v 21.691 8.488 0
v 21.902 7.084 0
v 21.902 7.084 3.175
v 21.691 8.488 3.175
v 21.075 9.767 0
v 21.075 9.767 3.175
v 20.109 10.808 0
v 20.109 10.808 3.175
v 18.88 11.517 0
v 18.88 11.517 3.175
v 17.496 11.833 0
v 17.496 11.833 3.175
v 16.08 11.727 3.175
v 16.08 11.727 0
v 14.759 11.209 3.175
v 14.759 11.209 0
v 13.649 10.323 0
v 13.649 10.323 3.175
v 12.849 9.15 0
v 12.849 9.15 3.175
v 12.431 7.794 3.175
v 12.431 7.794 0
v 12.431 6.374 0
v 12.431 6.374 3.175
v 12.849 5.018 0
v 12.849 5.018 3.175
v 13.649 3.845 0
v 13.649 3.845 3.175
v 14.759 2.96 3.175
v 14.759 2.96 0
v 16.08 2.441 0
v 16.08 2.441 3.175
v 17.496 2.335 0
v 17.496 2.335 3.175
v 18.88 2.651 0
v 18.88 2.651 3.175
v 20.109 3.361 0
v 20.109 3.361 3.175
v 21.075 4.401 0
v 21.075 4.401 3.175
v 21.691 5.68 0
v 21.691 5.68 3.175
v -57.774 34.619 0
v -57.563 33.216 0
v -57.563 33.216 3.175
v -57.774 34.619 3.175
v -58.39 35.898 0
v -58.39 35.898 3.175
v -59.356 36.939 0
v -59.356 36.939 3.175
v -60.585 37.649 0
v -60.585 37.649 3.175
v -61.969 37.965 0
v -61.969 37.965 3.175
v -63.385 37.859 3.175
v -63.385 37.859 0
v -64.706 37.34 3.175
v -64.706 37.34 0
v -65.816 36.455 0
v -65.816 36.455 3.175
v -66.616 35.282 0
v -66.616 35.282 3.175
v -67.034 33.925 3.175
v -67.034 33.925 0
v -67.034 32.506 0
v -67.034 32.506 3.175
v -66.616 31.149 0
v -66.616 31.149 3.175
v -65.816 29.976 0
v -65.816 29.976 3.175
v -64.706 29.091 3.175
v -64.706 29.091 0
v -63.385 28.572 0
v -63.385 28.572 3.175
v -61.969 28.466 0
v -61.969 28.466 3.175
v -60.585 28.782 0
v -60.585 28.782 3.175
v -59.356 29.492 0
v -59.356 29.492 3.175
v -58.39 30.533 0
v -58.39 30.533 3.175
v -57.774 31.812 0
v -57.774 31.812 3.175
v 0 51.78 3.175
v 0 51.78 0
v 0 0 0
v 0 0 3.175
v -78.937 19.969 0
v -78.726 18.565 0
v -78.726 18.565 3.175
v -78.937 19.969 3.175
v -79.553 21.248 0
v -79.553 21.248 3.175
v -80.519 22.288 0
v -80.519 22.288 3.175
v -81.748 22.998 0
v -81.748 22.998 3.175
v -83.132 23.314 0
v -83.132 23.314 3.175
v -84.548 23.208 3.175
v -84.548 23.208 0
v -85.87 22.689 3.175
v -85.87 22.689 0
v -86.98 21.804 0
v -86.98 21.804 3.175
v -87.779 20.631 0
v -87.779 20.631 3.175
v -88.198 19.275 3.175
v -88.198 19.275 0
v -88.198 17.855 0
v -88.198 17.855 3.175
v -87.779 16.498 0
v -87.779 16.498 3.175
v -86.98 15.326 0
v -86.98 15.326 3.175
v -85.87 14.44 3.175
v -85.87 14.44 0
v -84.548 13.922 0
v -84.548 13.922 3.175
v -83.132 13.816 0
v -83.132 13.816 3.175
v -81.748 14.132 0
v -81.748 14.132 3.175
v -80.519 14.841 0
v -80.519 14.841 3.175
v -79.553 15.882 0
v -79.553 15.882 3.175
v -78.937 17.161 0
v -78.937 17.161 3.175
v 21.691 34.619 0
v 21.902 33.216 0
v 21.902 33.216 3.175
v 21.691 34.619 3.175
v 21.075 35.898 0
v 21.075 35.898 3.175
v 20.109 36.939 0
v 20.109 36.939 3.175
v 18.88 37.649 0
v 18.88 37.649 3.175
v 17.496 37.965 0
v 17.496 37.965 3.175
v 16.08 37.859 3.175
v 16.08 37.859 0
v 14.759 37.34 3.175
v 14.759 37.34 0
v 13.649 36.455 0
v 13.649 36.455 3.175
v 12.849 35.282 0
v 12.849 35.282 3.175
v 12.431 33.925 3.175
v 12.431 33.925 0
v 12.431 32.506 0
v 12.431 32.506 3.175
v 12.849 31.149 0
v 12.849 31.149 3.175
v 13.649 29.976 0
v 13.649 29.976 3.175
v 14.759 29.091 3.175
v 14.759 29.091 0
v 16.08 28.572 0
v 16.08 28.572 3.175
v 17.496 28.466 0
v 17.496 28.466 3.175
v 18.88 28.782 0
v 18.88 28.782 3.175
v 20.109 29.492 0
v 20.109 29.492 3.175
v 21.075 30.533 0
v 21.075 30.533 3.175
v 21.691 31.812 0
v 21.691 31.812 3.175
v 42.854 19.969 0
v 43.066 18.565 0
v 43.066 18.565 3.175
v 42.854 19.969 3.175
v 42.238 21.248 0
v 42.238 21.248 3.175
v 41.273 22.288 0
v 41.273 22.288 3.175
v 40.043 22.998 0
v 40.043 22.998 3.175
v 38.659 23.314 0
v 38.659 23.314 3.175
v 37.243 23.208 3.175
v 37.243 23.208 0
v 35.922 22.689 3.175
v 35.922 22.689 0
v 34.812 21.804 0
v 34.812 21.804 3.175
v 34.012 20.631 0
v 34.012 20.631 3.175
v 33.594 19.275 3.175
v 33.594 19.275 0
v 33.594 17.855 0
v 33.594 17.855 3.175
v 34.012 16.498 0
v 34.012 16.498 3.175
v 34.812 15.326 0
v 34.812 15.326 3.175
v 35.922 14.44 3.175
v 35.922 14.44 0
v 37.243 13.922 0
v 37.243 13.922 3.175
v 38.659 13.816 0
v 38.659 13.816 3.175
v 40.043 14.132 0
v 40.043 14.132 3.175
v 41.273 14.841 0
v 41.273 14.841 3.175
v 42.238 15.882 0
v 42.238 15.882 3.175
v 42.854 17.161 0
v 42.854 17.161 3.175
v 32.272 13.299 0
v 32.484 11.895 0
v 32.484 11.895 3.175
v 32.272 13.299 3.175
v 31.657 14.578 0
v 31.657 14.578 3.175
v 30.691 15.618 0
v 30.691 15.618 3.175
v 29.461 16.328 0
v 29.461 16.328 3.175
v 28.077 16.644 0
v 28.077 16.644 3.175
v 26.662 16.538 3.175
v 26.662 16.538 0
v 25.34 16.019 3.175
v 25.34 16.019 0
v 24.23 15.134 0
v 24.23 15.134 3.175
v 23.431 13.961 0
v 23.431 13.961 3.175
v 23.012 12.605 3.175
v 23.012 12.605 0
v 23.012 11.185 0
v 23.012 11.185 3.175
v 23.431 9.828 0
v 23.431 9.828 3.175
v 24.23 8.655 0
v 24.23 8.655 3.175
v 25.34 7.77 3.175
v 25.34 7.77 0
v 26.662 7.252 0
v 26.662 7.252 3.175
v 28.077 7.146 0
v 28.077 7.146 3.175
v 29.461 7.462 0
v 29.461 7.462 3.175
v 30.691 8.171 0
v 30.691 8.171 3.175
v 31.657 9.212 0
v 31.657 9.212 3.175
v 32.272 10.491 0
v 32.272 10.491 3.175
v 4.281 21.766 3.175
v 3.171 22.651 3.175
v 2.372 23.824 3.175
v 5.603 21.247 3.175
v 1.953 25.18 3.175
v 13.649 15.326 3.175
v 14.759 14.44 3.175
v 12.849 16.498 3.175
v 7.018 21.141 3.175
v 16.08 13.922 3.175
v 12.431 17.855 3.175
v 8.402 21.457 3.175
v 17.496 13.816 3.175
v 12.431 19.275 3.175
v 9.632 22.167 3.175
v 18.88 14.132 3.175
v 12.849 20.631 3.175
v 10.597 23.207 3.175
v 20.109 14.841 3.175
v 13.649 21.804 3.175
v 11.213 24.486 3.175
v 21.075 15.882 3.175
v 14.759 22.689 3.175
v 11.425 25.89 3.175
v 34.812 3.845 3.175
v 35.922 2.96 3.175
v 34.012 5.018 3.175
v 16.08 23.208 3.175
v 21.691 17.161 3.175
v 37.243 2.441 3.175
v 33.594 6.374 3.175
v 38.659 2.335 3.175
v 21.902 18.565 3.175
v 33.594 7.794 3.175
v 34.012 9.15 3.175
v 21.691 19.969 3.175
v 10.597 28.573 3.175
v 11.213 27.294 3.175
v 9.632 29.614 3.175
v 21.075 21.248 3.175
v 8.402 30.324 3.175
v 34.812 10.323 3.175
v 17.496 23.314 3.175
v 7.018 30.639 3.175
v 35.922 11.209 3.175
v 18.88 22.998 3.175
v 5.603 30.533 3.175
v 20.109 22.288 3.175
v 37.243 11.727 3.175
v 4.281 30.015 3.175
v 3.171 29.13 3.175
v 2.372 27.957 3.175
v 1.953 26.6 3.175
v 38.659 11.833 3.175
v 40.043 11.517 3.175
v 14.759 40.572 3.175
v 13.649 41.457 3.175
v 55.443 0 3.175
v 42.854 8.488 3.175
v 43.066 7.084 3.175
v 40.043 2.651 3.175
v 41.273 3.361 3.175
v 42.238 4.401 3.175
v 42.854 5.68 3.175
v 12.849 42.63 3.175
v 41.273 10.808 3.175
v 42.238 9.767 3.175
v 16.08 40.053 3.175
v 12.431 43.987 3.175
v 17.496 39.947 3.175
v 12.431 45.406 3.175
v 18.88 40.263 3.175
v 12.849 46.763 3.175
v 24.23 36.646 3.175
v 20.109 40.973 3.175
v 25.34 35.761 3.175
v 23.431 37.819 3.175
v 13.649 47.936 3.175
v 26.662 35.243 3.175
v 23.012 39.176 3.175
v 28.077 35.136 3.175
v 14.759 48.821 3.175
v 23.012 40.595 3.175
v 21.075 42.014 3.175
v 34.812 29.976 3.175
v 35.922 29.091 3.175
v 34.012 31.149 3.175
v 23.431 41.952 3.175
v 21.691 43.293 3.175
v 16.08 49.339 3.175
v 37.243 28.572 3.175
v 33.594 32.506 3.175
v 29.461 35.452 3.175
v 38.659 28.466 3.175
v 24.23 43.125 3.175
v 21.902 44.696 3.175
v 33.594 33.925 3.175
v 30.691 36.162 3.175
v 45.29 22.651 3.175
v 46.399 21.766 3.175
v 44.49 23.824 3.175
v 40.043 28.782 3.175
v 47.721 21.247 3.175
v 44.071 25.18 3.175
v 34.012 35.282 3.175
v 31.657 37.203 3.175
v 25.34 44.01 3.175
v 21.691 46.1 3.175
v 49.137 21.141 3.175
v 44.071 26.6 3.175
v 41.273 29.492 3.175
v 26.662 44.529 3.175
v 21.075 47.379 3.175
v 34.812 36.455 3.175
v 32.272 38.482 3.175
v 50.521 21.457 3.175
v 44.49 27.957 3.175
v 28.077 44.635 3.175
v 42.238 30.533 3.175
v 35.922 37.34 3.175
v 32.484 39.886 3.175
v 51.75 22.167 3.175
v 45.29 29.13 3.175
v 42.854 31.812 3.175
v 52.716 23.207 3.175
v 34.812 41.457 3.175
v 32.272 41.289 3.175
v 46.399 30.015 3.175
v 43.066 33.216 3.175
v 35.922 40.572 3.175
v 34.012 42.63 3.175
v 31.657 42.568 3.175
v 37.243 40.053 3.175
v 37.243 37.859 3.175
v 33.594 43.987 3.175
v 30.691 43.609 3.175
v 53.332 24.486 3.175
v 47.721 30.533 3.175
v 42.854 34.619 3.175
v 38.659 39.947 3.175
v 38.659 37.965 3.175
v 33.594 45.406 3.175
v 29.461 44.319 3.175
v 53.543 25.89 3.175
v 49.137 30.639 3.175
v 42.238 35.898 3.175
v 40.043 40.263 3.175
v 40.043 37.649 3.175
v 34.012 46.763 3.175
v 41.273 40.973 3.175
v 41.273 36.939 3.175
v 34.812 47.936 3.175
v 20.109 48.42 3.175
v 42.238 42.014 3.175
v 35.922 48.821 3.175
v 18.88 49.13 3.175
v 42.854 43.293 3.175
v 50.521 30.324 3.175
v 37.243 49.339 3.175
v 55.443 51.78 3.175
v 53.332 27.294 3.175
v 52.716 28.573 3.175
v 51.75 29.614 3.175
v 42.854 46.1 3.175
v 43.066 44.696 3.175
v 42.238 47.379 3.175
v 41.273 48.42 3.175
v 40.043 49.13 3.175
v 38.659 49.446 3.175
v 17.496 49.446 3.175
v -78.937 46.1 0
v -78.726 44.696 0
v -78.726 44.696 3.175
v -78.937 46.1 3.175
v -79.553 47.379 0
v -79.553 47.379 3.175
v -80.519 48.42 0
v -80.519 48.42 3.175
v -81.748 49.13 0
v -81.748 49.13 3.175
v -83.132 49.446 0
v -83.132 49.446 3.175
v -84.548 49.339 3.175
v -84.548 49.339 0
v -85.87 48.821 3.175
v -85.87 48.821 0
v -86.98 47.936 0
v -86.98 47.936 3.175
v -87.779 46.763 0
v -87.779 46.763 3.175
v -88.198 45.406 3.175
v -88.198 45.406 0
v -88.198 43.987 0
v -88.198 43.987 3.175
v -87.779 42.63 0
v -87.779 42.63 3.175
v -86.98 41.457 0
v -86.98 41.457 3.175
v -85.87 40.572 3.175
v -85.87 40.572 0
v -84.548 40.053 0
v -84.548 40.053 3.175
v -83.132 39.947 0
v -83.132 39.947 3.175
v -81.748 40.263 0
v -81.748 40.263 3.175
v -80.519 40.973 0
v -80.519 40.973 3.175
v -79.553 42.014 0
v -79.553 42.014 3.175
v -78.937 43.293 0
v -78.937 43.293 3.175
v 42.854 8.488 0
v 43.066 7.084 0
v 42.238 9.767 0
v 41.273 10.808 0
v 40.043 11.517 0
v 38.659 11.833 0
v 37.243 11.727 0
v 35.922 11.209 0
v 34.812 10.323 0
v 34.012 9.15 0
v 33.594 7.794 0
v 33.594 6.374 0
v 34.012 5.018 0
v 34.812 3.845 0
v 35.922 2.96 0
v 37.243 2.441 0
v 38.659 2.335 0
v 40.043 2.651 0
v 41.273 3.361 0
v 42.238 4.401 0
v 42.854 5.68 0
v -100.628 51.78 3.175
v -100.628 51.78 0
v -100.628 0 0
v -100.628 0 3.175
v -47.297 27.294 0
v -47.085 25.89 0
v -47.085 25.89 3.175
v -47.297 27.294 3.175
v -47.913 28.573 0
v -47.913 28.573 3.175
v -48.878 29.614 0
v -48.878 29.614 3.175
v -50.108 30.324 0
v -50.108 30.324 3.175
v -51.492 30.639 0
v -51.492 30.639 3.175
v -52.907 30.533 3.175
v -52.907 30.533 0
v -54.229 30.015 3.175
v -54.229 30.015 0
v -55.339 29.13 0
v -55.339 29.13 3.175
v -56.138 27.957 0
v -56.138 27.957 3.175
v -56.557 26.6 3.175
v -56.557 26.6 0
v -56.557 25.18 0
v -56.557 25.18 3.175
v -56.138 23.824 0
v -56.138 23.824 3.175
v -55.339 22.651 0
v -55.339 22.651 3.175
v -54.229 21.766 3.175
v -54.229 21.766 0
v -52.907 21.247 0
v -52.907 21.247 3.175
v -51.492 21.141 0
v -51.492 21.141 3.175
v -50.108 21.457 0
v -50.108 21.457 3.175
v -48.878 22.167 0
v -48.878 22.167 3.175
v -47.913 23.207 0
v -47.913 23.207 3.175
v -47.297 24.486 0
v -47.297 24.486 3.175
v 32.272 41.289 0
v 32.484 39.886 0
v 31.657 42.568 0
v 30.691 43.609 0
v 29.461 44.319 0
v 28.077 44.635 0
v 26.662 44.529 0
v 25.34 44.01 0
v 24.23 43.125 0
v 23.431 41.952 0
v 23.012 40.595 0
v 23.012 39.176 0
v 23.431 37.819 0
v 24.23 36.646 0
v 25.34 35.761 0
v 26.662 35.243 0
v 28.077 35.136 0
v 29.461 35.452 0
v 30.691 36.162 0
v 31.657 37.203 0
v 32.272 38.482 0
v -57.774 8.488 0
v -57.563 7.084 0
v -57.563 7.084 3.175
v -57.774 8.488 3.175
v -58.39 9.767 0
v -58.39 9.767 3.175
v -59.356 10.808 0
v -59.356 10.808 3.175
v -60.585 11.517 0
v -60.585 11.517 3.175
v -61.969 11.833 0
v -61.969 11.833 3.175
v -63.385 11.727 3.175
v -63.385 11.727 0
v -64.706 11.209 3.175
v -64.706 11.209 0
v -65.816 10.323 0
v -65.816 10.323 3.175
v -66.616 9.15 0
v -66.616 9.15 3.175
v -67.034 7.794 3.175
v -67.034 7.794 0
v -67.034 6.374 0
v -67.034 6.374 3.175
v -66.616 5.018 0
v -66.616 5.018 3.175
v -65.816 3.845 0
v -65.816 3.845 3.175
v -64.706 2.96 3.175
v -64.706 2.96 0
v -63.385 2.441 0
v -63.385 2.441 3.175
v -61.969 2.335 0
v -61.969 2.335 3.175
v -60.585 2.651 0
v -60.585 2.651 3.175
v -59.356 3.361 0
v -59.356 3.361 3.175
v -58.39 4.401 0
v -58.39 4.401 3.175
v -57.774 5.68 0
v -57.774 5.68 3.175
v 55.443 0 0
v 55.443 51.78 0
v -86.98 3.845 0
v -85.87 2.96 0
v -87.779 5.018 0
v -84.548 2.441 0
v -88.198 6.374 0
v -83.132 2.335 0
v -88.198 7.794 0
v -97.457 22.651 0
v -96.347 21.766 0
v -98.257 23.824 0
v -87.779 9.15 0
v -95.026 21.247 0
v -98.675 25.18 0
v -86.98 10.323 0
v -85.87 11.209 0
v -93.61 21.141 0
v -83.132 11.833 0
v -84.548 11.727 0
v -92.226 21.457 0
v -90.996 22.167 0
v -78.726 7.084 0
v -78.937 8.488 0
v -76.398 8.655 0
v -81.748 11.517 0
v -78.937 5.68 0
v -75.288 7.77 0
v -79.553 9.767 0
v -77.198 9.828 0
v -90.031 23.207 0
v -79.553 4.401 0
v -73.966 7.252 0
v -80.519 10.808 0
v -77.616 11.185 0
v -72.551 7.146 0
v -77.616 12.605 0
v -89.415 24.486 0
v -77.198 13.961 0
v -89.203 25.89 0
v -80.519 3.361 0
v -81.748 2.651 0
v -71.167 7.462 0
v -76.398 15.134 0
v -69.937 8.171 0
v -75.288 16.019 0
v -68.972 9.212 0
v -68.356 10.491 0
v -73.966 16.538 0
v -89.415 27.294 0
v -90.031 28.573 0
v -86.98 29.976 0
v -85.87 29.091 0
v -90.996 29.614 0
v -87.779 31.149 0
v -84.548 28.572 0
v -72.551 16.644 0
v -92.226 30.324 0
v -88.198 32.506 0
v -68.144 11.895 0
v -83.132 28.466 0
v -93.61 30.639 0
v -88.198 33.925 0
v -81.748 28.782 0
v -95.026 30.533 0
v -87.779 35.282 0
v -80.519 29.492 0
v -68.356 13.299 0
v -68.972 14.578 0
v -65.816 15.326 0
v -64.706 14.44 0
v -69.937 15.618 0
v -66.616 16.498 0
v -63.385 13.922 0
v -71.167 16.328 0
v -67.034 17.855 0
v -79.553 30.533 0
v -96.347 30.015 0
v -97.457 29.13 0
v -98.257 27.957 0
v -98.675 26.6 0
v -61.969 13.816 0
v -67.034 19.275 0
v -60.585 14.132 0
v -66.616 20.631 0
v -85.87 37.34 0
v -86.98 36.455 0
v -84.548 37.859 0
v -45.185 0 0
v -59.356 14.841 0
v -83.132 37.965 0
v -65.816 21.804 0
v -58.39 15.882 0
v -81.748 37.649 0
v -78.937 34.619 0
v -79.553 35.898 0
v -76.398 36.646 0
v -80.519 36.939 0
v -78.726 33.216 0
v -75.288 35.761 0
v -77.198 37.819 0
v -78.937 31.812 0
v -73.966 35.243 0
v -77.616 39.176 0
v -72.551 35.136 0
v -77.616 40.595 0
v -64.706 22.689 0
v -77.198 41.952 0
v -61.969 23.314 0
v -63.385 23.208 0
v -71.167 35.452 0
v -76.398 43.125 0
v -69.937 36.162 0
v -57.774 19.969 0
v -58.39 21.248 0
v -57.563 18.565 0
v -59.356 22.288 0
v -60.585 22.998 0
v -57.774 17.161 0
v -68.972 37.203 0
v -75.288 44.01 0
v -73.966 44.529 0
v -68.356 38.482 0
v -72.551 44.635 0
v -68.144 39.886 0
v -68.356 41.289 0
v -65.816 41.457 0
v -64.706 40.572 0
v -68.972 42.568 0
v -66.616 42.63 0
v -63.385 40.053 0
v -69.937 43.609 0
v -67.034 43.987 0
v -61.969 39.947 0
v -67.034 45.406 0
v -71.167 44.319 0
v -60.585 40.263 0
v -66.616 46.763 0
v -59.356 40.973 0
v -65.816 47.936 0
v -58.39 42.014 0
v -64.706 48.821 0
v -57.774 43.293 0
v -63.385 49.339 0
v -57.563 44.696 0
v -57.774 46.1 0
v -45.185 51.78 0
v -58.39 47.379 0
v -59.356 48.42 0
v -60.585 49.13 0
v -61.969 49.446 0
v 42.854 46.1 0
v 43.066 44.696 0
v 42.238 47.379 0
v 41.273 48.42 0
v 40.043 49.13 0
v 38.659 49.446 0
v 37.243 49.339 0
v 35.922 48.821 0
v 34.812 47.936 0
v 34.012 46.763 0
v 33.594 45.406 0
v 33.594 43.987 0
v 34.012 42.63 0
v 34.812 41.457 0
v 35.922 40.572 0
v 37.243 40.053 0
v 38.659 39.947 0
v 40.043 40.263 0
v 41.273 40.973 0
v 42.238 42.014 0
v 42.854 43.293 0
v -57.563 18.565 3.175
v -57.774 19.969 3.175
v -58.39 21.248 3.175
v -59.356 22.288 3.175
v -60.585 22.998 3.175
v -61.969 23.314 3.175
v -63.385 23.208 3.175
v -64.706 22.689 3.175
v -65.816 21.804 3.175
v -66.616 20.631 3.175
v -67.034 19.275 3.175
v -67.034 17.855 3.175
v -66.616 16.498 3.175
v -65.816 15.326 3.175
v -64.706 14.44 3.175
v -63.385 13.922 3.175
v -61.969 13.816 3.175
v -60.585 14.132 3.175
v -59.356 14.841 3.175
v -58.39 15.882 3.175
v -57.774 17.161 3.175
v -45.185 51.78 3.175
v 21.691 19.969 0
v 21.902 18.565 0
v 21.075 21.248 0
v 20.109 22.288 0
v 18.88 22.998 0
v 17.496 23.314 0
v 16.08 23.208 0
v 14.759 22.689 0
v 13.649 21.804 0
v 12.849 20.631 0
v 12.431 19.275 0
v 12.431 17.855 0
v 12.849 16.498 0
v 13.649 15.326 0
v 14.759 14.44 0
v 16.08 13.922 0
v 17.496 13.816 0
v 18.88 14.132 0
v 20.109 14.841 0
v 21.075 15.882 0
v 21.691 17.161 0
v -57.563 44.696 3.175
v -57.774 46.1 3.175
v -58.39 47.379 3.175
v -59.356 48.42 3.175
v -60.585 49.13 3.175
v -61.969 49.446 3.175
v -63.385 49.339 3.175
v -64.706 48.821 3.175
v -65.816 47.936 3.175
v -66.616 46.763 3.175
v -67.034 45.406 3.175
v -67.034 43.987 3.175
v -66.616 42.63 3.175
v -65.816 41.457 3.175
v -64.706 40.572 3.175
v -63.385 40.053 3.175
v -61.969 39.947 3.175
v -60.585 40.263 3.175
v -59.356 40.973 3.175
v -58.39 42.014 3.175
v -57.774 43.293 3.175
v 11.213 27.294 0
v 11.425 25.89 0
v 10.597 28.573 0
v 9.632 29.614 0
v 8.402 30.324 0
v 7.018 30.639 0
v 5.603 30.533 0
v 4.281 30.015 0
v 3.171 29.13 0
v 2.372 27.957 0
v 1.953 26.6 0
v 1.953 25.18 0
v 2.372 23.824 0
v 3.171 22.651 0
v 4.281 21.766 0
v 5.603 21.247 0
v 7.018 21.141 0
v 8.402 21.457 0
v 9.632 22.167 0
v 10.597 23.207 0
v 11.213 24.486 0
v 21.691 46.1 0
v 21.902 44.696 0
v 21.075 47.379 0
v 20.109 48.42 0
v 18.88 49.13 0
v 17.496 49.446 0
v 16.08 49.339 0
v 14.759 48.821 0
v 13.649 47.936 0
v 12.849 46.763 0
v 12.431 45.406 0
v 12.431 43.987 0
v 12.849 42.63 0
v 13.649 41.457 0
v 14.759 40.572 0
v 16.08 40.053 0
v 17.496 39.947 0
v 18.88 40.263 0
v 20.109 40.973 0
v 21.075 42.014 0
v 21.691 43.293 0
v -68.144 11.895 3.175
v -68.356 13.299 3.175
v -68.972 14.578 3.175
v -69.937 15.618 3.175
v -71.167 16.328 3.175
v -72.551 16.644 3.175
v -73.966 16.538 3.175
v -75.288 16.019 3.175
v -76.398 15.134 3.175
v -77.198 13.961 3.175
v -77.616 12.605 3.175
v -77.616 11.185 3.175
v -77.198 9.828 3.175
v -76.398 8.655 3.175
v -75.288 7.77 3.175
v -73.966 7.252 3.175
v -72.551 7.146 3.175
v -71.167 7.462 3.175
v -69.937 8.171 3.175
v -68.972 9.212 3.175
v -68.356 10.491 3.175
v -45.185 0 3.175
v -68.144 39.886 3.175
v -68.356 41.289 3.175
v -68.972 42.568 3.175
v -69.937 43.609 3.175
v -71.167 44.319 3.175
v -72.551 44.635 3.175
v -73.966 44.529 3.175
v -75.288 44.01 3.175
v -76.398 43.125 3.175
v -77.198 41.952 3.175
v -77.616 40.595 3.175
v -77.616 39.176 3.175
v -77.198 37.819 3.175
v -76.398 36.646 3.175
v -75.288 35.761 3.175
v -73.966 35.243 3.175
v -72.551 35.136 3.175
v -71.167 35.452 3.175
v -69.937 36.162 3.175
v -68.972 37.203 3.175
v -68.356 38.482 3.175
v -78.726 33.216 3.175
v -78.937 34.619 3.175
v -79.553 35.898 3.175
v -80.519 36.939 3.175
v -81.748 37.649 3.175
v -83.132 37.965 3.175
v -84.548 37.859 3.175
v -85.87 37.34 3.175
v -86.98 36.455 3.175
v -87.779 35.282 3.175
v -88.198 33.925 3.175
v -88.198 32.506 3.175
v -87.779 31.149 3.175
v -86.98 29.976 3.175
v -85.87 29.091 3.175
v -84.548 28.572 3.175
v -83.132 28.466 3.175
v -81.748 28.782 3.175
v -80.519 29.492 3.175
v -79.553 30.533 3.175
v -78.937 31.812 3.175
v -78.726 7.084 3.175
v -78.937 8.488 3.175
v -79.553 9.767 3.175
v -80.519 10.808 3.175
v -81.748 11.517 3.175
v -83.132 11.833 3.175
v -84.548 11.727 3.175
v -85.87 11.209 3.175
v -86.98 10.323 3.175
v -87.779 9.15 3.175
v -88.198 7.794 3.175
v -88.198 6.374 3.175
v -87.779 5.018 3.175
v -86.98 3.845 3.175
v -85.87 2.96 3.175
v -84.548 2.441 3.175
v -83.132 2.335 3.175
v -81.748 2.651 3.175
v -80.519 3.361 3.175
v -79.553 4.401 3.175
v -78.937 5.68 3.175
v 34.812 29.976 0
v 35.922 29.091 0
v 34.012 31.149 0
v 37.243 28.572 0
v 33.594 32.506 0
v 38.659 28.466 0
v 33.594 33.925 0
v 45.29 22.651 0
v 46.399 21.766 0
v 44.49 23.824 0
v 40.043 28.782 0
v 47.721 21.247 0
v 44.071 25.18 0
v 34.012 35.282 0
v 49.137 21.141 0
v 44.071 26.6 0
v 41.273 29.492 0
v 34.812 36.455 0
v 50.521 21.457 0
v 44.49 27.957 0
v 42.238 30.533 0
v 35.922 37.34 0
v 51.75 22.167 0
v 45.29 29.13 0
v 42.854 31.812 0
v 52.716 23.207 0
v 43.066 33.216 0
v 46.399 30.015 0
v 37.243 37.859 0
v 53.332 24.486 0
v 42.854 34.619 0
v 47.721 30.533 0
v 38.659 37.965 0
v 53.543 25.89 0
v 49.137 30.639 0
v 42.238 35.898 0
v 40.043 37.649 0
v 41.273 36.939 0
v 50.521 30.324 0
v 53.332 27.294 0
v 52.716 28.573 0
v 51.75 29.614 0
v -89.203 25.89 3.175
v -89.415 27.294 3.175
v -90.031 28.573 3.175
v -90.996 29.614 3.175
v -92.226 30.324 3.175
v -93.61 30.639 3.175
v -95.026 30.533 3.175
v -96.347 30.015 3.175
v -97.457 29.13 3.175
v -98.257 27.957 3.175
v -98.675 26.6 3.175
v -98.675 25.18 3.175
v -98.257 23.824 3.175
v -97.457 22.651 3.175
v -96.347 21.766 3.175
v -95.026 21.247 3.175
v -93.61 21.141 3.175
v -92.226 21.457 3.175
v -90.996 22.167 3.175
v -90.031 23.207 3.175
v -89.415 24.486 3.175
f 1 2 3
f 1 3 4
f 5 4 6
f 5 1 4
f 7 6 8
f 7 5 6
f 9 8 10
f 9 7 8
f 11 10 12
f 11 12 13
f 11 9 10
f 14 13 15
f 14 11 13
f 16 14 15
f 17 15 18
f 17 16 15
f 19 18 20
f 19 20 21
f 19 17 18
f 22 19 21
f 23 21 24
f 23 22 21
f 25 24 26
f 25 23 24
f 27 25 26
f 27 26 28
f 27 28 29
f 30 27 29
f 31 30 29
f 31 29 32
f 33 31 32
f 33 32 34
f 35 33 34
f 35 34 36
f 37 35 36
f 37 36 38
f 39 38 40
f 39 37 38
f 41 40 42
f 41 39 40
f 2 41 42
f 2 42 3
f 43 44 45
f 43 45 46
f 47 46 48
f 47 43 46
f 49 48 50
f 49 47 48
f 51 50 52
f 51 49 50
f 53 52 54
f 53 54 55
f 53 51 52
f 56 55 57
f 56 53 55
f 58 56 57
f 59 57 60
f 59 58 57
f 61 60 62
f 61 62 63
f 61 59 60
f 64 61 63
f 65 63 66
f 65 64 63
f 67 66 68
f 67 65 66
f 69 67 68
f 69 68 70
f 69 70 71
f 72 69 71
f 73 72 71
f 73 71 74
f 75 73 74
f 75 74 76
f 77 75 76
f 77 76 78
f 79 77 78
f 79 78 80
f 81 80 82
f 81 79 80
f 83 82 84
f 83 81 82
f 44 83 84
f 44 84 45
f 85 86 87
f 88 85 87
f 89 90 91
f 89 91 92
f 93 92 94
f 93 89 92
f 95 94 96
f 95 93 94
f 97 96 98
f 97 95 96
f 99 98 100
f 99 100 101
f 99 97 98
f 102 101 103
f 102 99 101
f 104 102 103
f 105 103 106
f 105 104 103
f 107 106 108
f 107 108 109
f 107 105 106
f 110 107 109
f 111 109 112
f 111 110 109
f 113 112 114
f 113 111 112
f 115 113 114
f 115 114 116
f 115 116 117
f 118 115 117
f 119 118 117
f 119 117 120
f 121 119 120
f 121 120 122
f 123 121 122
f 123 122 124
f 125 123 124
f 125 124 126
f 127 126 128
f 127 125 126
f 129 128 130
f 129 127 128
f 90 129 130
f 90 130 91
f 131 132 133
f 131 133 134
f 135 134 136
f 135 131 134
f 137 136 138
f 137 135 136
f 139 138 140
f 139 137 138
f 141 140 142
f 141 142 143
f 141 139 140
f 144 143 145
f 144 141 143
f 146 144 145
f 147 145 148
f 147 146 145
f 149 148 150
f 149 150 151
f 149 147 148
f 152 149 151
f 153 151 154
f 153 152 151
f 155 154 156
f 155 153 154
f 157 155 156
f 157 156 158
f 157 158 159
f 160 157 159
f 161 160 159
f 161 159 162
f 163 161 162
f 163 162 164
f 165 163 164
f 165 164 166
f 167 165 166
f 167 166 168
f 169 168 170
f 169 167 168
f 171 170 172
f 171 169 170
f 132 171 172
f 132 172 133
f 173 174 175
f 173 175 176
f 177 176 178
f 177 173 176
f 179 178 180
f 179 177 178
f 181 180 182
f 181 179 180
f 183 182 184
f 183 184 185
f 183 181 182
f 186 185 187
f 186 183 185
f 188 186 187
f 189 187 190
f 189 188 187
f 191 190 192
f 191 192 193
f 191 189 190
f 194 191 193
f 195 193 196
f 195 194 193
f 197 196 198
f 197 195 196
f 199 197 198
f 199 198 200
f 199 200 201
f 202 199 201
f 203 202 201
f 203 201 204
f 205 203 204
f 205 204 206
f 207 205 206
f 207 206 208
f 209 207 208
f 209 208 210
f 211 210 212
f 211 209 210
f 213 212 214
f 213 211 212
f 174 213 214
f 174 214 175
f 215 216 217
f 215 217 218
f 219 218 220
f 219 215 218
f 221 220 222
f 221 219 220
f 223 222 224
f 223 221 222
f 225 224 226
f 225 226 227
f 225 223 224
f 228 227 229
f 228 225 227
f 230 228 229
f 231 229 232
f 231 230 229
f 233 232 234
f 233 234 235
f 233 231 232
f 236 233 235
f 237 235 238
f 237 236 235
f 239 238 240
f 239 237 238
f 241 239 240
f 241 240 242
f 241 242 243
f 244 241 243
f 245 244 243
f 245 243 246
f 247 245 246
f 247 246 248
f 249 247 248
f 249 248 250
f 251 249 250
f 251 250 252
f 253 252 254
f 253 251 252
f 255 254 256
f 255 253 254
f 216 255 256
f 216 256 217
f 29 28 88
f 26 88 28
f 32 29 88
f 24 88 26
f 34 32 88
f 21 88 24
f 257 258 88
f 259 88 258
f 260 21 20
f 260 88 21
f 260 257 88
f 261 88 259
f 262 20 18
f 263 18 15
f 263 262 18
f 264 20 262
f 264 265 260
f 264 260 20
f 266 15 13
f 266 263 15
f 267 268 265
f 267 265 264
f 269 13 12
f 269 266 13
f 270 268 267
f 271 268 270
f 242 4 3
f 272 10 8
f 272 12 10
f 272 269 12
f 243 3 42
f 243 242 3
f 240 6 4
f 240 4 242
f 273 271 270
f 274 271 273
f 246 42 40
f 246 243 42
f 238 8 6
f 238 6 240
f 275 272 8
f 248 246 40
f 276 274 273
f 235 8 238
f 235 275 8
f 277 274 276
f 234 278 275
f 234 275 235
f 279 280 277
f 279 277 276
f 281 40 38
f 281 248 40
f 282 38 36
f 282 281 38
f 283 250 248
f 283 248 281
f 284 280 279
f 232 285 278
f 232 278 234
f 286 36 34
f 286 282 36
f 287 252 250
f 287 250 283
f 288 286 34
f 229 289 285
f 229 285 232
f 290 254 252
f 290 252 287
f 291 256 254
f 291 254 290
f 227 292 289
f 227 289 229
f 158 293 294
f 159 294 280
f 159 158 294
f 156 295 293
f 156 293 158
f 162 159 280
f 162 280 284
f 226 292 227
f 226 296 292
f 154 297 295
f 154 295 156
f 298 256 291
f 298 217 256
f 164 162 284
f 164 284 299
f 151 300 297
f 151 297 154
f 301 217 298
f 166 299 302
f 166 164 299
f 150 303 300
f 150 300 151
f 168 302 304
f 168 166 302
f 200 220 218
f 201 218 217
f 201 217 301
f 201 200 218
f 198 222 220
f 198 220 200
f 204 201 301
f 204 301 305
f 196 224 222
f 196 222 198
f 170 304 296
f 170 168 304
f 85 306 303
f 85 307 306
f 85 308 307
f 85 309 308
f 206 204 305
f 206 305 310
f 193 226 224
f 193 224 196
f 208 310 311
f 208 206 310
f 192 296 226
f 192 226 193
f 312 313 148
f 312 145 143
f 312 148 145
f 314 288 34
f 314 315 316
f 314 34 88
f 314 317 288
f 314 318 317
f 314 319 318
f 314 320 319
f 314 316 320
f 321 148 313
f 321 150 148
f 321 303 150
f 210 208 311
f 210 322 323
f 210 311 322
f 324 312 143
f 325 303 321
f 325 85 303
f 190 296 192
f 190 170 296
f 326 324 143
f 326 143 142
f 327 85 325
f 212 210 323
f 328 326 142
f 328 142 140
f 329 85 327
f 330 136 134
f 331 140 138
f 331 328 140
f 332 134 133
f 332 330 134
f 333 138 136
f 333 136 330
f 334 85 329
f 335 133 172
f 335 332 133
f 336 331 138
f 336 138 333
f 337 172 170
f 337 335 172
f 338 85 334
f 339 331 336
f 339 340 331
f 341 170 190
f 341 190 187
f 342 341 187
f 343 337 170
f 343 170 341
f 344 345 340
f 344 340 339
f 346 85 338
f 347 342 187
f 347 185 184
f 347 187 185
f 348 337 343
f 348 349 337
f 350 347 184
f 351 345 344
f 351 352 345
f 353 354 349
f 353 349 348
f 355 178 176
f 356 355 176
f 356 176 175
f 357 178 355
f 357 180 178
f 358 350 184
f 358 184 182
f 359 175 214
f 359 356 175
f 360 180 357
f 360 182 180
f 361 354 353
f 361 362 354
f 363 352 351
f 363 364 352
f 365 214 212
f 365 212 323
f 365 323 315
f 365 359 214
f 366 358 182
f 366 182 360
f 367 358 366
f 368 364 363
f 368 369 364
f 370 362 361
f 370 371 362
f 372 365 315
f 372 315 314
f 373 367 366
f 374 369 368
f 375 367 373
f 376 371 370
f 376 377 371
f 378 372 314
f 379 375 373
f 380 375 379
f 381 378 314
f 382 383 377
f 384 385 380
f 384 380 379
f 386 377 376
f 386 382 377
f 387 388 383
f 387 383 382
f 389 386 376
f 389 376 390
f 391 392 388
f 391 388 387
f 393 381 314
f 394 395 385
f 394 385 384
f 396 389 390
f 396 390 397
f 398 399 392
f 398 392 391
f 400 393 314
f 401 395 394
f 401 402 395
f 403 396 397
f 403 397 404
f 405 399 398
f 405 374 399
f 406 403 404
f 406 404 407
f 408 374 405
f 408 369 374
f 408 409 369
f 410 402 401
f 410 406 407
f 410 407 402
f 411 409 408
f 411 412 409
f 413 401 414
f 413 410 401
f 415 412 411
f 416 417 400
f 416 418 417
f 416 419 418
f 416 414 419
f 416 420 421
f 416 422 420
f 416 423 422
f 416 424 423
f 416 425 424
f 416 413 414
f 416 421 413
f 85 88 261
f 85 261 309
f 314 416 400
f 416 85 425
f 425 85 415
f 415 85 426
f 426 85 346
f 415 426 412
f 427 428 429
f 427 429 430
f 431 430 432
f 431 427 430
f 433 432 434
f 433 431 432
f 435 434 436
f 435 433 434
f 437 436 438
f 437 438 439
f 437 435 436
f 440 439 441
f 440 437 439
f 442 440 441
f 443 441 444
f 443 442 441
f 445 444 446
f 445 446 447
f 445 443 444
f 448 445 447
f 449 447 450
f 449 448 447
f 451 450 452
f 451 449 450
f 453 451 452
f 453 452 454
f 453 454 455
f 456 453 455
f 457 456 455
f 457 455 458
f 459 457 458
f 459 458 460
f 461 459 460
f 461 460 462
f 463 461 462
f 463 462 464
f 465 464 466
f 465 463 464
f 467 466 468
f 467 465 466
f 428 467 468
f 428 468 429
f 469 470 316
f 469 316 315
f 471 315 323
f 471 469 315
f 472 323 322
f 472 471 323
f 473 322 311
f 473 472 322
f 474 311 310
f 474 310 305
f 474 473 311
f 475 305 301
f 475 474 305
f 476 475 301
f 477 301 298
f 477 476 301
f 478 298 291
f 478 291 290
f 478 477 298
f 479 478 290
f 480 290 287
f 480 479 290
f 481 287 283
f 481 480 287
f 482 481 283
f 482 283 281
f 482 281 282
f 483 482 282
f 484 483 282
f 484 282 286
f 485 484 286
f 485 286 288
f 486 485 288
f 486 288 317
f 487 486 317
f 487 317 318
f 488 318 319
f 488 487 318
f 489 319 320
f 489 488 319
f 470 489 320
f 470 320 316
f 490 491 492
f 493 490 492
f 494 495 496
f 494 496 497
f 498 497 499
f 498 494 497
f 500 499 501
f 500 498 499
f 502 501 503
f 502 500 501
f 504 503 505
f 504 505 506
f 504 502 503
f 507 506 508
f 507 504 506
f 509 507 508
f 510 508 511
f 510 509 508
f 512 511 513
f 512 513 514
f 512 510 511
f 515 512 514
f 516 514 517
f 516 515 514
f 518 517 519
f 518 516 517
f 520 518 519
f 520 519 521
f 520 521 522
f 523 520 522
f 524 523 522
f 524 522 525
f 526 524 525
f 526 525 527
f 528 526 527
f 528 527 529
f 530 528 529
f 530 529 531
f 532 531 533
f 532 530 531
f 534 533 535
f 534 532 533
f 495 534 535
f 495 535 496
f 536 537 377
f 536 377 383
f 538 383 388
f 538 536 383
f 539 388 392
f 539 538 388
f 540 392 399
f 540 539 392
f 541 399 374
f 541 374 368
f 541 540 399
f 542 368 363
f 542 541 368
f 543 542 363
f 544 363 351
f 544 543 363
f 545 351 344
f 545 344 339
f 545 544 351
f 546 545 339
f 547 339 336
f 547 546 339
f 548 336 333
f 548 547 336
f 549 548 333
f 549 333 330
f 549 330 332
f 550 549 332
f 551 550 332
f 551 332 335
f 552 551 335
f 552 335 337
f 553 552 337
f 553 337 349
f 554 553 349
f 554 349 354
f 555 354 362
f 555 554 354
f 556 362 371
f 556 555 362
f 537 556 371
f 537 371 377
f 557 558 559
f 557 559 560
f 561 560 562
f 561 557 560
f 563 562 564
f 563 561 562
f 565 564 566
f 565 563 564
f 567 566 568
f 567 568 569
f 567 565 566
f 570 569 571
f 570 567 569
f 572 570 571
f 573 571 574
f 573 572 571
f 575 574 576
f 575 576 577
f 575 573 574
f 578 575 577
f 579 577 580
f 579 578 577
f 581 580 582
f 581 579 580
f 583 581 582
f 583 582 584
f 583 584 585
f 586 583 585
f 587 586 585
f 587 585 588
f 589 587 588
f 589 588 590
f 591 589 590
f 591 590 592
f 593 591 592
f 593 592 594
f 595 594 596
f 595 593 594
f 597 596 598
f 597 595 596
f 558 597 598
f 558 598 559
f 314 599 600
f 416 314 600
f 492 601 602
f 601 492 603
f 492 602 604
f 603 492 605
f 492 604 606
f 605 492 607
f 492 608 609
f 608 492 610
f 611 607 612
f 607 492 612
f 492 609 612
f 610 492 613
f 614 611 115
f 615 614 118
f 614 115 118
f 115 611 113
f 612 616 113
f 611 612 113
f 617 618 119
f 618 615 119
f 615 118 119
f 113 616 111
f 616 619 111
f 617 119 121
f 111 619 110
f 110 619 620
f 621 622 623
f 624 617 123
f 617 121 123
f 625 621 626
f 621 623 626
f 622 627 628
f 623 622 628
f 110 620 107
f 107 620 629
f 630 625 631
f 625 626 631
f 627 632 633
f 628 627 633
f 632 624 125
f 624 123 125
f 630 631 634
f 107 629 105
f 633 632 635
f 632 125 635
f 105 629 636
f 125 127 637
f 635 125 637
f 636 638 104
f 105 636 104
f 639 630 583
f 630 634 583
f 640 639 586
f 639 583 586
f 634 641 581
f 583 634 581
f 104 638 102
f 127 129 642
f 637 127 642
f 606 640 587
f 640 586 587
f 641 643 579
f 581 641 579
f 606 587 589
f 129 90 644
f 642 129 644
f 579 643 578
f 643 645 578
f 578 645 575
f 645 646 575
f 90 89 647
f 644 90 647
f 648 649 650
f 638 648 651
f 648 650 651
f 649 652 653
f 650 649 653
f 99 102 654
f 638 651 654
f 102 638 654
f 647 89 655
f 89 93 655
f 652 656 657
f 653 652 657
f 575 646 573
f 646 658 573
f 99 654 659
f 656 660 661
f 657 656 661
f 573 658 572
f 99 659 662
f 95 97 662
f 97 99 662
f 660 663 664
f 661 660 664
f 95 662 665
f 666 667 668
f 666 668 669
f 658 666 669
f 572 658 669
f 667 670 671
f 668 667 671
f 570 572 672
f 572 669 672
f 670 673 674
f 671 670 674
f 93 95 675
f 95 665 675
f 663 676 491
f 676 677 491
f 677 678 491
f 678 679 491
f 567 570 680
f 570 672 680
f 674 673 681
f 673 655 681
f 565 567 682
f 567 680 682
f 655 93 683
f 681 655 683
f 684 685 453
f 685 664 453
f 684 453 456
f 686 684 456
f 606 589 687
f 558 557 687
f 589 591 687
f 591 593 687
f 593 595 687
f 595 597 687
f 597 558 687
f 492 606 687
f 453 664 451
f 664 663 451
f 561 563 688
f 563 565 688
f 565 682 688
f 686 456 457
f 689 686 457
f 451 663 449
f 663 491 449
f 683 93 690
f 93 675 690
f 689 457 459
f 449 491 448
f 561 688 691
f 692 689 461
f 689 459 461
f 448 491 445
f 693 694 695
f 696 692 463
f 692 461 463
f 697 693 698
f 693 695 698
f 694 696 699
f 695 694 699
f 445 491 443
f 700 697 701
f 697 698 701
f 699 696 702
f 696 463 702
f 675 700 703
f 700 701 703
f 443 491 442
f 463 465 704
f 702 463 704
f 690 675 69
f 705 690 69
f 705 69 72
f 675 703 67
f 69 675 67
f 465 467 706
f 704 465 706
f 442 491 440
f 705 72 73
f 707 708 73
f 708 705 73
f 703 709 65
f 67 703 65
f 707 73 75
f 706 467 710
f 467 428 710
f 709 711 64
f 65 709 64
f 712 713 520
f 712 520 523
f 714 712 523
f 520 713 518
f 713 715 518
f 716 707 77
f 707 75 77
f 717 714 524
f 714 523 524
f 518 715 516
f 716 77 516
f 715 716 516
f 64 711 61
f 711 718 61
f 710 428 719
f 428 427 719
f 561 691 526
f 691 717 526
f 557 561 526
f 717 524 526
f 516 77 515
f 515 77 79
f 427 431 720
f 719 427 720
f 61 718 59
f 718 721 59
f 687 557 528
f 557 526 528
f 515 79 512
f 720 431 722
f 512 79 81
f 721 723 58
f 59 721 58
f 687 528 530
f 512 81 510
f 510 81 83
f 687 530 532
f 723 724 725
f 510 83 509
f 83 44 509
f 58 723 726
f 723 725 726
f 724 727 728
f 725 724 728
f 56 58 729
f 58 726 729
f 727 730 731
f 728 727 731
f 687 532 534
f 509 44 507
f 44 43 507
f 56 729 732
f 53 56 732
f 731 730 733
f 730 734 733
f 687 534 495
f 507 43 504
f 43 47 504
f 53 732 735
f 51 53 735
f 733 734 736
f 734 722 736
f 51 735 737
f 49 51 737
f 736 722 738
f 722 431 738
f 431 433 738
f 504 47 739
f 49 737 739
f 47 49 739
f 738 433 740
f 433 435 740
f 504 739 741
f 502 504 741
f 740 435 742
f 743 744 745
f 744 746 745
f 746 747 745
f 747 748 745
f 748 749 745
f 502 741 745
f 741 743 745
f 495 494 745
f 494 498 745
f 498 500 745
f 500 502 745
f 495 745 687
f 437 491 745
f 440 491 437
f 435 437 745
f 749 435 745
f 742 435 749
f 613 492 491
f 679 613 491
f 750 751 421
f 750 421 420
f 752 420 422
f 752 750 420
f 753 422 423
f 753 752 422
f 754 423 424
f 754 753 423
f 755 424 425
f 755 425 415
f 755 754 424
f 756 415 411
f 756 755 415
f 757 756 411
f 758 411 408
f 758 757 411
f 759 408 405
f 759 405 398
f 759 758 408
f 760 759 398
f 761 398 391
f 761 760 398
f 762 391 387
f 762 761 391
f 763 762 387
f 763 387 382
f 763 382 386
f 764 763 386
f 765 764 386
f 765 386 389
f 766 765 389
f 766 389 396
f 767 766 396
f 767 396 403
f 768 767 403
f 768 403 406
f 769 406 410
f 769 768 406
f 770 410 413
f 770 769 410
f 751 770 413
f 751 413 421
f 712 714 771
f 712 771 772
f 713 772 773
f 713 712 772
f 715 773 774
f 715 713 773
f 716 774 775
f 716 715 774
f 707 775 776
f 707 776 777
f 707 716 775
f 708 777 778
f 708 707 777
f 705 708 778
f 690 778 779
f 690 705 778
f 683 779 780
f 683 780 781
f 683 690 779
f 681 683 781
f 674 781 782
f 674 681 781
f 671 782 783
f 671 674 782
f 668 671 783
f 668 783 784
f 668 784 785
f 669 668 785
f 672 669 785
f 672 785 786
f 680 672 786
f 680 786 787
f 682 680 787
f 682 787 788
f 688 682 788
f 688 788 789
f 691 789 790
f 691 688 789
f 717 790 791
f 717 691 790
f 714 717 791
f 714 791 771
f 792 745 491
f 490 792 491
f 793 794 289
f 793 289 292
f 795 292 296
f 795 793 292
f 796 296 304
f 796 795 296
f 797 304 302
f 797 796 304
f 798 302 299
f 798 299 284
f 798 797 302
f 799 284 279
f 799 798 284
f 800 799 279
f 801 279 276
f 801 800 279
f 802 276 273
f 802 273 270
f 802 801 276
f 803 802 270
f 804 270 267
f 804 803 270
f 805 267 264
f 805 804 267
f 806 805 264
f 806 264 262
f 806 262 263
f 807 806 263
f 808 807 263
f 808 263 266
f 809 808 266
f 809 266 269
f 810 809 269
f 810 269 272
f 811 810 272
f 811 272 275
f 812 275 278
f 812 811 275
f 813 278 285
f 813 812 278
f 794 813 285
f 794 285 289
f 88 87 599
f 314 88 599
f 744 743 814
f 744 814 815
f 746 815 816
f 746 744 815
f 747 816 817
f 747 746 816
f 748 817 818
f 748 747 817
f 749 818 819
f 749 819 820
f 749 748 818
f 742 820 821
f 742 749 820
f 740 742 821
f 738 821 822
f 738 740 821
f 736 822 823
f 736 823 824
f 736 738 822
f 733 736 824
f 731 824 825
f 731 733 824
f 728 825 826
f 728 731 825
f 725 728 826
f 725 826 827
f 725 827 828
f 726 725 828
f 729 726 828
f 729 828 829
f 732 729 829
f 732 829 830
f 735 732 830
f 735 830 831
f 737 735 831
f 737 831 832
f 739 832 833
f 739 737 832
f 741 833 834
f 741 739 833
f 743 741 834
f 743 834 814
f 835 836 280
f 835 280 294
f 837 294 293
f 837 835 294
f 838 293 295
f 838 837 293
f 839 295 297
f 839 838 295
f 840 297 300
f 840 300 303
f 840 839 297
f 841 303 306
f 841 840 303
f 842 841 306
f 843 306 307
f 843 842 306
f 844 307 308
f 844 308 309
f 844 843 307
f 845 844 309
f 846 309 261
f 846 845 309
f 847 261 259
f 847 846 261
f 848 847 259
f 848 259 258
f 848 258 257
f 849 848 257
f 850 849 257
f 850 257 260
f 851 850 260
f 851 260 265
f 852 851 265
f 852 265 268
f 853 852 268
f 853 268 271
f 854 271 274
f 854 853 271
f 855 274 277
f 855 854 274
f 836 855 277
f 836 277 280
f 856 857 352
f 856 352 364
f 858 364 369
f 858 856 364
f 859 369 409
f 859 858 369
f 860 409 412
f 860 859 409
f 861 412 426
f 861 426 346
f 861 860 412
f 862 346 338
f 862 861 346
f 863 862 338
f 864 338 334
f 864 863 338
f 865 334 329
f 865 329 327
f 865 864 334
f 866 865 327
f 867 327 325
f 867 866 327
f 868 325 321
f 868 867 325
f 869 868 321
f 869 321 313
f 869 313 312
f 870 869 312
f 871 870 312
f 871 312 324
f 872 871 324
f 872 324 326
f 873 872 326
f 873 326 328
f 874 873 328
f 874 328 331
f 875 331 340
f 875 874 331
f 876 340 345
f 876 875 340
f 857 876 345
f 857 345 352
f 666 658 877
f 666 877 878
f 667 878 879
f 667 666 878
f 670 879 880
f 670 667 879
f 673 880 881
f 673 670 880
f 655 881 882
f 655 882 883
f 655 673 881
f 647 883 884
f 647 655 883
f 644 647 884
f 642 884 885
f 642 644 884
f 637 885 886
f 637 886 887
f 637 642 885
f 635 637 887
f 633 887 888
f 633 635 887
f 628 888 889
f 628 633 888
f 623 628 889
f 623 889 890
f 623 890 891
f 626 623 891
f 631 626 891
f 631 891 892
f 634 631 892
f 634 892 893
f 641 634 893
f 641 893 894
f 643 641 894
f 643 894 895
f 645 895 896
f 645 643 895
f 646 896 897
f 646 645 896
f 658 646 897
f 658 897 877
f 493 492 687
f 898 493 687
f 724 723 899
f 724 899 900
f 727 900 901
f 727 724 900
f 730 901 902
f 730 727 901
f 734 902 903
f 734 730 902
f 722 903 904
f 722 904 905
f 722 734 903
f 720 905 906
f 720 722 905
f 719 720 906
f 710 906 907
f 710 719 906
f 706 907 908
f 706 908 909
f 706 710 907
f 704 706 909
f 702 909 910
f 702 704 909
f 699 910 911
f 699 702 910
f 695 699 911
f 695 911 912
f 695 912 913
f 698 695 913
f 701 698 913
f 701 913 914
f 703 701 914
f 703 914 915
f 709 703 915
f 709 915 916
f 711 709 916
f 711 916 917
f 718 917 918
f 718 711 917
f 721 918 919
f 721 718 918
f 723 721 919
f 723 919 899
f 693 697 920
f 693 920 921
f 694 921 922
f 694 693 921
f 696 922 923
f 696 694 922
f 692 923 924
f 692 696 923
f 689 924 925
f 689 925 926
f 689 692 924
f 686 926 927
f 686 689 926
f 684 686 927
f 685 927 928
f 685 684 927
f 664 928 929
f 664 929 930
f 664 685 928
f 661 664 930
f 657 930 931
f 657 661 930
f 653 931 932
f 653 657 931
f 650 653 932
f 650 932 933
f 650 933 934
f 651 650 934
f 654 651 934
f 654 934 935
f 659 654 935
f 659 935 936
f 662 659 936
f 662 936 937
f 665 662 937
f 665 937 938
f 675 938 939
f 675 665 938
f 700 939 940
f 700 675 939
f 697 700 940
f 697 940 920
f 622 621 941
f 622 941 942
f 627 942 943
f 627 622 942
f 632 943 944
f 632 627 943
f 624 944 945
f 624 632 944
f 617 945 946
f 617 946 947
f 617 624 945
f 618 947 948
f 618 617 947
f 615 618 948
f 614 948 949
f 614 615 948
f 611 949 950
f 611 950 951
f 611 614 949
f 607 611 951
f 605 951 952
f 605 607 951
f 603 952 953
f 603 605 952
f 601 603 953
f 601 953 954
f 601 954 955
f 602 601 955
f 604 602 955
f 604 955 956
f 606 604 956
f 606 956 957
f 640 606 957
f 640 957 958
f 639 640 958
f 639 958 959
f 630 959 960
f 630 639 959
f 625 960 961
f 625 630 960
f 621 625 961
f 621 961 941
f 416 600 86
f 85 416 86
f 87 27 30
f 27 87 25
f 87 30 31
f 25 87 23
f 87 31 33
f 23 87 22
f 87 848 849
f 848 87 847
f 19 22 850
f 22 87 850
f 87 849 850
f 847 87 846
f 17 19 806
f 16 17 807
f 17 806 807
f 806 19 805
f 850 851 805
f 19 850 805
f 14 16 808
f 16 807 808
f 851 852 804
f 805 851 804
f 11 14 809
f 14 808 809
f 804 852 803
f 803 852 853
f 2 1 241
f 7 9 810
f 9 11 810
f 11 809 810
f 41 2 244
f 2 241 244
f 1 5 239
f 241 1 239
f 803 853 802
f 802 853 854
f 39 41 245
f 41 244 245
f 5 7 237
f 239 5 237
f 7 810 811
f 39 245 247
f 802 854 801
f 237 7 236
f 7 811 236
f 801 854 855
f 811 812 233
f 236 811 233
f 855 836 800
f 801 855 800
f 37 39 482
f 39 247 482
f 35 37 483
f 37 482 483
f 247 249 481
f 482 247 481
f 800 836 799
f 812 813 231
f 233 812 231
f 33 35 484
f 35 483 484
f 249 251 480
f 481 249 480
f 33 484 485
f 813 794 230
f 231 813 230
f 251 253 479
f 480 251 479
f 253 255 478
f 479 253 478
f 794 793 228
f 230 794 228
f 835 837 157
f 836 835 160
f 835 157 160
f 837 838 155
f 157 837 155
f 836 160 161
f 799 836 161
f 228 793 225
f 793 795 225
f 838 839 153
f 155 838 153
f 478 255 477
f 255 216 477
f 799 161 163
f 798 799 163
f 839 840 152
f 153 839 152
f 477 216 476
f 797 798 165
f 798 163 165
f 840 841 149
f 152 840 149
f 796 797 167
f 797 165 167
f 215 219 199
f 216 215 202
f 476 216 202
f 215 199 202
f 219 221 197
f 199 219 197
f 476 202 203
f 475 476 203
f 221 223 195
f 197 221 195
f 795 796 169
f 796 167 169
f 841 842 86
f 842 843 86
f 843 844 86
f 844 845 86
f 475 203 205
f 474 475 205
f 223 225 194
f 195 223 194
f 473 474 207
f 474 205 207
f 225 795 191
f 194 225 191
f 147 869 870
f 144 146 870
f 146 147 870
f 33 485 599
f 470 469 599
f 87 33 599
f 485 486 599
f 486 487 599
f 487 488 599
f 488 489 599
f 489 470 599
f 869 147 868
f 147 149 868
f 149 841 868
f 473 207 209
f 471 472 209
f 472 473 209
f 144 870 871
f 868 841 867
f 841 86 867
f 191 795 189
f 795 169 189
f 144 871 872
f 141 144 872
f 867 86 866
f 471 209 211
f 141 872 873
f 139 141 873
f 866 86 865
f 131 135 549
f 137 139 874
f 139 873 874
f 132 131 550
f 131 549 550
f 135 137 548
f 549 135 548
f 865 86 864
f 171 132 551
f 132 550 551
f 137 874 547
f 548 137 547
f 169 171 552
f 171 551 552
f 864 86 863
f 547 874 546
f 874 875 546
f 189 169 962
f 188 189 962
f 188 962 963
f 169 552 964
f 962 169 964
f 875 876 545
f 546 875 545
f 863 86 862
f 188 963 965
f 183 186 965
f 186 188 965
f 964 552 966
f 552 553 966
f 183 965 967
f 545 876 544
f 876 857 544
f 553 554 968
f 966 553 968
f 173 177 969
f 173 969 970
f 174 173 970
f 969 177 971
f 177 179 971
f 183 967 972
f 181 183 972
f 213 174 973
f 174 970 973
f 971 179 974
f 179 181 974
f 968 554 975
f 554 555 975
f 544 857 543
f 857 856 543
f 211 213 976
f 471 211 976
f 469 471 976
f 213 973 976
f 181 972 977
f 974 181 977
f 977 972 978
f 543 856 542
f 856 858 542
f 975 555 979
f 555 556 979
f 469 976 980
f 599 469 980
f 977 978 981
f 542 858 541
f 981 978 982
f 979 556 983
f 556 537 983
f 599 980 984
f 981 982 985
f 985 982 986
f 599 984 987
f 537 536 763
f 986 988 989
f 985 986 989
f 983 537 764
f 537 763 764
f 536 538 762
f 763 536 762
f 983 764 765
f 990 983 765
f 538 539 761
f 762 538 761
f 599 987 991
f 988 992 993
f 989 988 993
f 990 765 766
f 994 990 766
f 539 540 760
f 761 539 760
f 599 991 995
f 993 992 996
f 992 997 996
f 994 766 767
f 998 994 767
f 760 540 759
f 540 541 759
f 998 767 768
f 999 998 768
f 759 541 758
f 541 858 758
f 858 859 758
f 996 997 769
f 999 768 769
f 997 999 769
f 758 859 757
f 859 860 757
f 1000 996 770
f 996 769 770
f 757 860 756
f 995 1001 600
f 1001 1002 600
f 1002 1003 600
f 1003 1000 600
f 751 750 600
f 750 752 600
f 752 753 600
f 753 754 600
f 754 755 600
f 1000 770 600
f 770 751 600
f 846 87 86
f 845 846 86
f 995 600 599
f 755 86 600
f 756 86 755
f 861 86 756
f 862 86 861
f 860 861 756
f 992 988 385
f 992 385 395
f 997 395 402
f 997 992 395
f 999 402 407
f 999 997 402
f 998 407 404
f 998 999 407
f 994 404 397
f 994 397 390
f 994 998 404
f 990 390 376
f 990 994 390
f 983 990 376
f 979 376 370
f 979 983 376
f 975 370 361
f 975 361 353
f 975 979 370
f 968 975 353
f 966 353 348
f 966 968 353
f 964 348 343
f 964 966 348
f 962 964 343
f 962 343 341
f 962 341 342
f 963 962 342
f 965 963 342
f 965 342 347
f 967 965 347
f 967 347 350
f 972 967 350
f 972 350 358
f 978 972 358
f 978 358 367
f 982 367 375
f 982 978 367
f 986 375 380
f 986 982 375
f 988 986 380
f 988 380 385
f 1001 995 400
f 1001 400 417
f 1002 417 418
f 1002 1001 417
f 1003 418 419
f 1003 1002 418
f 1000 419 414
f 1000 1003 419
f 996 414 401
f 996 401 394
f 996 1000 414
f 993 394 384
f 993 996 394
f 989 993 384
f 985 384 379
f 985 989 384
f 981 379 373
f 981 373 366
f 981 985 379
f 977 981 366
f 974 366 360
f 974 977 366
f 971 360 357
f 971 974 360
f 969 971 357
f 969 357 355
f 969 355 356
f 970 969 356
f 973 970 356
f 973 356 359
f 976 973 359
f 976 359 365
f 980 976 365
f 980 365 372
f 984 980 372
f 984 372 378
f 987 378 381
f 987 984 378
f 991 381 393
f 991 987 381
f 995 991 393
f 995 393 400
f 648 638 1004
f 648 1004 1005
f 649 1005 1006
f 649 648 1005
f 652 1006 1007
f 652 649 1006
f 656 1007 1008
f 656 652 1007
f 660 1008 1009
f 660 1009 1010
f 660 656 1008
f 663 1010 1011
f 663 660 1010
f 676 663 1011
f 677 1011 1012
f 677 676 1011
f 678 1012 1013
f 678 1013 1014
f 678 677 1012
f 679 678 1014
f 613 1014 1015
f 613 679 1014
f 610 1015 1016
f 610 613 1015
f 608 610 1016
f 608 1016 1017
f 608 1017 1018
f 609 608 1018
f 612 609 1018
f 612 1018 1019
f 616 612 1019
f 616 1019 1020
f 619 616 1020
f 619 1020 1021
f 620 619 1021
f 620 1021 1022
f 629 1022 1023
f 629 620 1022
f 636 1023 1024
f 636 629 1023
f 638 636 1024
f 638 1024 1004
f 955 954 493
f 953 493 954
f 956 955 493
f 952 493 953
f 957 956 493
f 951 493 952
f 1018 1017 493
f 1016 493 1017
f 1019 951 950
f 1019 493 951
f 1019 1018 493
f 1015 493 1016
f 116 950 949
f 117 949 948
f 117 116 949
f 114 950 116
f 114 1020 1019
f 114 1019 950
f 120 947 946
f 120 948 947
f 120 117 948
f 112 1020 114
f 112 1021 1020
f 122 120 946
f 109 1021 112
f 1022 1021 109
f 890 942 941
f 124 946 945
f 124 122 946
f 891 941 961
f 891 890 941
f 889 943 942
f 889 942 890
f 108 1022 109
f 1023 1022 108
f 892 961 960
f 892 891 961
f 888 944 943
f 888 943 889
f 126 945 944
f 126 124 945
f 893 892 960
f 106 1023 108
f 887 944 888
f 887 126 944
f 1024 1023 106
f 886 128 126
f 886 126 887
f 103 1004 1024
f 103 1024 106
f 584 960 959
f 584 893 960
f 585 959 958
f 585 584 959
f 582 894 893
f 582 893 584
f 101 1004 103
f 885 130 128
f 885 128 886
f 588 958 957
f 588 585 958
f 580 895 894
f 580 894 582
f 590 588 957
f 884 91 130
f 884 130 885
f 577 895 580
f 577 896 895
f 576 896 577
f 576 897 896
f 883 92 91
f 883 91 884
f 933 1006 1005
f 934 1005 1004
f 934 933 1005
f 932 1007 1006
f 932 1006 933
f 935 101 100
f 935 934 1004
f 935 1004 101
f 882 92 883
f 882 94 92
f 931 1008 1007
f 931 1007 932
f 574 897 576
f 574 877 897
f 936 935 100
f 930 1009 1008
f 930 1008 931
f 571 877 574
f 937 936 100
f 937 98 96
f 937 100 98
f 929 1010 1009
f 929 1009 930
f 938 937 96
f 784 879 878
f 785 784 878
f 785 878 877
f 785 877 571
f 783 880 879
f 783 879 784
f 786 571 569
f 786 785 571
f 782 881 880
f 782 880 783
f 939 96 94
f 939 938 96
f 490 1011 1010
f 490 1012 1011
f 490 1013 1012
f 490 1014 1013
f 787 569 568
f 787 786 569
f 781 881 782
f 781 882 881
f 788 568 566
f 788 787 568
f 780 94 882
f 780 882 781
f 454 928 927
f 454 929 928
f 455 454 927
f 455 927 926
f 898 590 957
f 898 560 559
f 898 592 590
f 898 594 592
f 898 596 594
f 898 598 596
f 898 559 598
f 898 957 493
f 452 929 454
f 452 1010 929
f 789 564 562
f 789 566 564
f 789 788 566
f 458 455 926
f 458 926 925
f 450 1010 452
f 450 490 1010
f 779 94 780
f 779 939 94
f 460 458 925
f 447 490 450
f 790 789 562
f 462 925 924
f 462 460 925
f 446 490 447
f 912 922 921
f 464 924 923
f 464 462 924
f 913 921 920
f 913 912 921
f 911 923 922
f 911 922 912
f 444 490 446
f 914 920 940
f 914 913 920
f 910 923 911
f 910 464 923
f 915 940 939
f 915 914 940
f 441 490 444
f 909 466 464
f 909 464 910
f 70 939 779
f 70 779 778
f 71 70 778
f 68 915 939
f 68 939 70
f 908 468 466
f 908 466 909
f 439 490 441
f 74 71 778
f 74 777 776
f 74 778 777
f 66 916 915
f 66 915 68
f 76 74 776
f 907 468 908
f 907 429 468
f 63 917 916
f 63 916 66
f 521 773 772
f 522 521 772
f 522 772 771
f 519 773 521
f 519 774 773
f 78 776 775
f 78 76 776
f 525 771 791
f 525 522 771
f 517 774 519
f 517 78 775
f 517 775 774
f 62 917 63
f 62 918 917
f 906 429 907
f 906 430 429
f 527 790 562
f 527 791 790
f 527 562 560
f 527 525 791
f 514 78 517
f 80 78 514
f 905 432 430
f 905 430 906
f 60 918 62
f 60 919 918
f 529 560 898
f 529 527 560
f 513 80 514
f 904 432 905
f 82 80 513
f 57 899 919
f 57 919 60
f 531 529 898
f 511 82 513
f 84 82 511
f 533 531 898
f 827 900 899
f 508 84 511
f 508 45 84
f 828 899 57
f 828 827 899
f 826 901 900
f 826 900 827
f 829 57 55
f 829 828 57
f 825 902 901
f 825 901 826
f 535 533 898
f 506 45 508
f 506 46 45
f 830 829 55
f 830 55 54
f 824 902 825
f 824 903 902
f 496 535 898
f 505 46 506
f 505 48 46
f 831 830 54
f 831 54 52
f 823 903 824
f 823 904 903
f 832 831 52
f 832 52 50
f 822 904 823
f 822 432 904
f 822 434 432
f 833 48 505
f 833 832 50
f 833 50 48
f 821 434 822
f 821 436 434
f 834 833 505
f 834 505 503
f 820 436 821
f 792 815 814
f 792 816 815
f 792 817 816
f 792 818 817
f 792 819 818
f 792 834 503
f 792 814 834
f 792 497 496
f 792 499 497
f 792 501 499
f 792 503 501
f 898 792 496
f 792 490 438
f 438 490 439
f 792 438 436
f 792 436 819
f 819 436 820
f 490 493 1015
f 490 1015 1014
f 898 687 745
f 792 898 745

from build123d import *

# Parameters (mm, degrees)
F0_R     = 4.7625
F1_DEPTH = 3.175


with BuildPart() as f1:
    # F0 (on Top) → F1 (new body)
    with BuildSketch(Plane.XY):
        Polygon((-100.628261, 0), (-45.185141, 0), (-45.185141, 51.78044), (-62.325061, 51.78044), (-83.488341, 51.78044), (-100.628261, 51.78044), align=None)
        with Locations((-83.488341, 7.08406)):
            Circle(F0_R, mode=Mode.SUBTRACT)
        with Locations((-62.325061, 7.08406)):
            Circle(F0_R, mode=Mode.SUBTRACT)
        with Locations((-72.906701, 11.89482)):
            Circle(F0_R, mode=Mode.SUBTRACT)
        with Locations((-83.488341, 18.56486)):
            Circle(F0_R, mode=Mode.SUBTRACT)
        with Locations((-62.325061, 18.56486)):
            Circle(F0_R, mode=Mode.SUBTRACT)
        with Locations((-93.965841, 25.89022)):
            Circle(F0_R, mode=Mode.SUBTRACT)
        with Locations((-83.488341, 33.21558)):
            Circle(F0_R, mode=Mode.SUBTRACT)
        with Locations((-62.325061, 33.21558)):
            Circle(F0_R, mode=Mode.SUBTRACT)
        with Locations((-51.847561, 25.89022)):
            Circle(F0_R, mode=Mode.SUBTRACT)
        with Locations((-83.488341, 44.69638)):
            Circle(F0_R, mode=Mode.SUBTRACT)
        with Locations((-72.906701, 39.88562)):
            Circle(F0_R, mode=Mode.SUBTRACT)
        with Locations((-62.325061, 44.69638)):
            Circle(F0_R, mode=Mode.SUBTRACT)
        Polygon((0, 51.78044), (0, 0), (55.44312, 0), (55.44312, 51.78044), (38.3032, 51.78044), (17.13992, 51.78044), align=None)
        with Locations((17.13992, 7.08406)):
            Circle(F0_R, mode=Mode.SUBTRACT)
        with Locations((27.72156, 11.89482)):
            Circle(F0_R, mode=Mode.SUBTRACT)
        with Locations((38.3032, 7.08406)):
            Circle(F0_R, mode=Mode.SUBTRACT)
        with Locations((17.13992, 18.56486)):
            Circle(F0_R, mode=Mode.SUBTRACT)
        with Locations((38.3032, 18.56486)):
            Circle(F0_R, mode=Mode.SUBTRACT)
        with Locations((6.66242, 25.89022)):
            Circle(F0_R, mode=Mode.SUBTRACT)
        with Locations((48.7807, 25.89022)):
            Circle(F0_R, mode=Mode.SUBTRACT)
        with Locations((17.13992, 33.21558)):
            Circle(F0_R, mode=Mode.SUBTRACT)
        with Locations((38.3032, 33.21558)):
            Circle(F0_R, mode=Mode.SUBTRACT)
        with Locations((27.72156, 39.88562)):
            Circle(F0_R, mode=Mode.SUBTRACT)
        with Locations((17.13992, 44.69638)):
            Circle(F0_R, mode=Mode.SUBTRACT)
        with Locations((38.3032, 44.69638)):
            Circle(F0_R, mode=Mode.SUBTRACT)
    extrude(amount=F1_DEPTH)


solid = f1.part
